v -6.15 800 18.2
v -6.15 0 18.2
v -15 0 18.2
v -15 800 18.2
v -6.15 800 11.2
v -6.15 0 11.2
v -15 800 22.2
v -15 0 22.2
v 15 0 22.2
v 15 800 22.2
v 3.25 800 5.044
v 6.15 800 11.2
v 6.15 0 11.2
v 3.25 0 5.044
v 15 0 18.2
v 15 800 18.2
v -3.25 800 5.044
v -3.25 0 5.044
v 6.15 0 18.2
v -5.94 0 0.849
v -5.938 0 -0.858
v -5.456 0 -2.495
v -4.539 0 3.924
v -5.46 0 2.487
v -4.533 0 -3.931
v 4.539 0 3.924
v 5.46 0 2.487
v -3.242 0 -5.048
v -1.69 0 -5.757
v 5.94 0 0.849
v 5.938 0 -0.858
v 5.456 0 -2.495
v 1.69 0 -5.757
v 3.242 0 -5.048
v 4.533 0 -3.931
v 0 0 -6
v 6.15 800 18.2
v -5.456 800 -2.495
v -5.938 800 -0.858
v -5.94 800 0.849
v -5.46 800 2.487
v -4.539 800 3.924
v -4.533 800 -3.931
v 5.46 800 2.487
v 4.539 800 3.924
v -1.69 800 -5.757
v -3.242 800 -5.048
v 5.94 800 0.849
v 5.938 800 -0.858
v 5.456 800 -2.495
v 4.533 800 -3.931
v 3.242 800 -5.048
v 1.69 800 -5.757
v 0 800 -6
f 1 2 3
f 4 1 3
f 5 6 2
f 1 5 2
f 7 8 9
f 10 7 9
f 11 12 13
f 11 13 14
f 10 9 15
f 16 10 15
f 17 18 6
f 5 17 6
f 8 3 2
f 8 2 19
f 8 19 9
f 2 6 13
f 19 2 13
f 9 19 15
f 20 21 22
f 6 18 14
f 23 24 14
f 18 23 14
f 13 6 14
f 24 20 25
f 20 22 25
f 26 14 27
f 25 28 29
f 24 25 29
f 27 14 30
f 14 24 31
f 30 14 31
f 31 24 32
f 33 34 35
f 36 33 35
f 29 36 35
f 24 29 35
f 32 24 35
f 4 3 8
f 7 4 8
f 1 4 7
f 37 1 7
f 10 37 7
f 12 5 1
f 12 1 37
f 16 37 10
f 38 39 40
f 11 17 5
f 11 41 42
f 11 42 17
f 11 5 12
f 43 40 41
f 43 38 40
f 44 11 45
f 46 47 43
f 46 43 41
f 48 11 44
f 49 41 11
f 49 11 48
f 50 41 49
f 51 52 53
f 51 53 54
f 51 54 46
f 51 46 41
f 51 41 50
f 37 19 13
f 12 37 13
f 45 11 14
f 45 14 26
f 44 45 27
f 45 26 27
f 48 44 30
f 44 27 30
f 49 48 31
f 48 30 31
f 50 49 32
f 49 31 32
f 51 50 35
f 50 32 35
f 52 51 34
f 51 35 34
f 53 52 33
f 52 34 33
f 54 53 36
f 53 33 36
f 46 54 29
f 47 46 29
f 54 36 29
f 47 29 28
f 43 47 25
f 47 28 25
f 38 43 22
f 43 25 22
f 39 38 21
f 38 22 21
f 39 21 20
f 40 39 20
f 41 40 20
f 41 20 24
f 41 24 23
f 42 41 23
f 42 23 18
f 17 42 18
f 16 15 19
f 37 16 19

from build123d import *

# Parameters (mm, degrees)
BOSS_EXTRUDE1_DEPTH = 800


with BuildPart() as part:
    # Sketch1 → Boss-Extrude1 (new body)
    with BuildSketch(Plane(origin=(0, 0, 0), x_dir=(1, 0, 0), z_dir=(0, 1, 0))):
        with BuildLine():
            Line((-3.25, -5.04356025), (-6.15, -11.2))
            Line((-6.15, -11.2), (-6.15, -18.2))
            Line((-6.15, -18.2), (-15, -18.2))
            Line((-15, -18.2), (-15, -22.2))
            Line((-15, -22.2), (15, -22.2))
            Line((15, -22.2), (15, -18.2))
            Line((15, -18.2), (6.15, -18.2))
            Line((6.15, -18.2), (6.15, -11.2))
            Line((6.15, -11.2), (3.25, -5.04356025))
            ThreePointArc((3.25, -5.04356025), (0, 6), (-3.25, -5.04356025))
        make_face()
    extrude(amount=BOSS_EXTRUDE1_DEPTH)


solid = part.part
